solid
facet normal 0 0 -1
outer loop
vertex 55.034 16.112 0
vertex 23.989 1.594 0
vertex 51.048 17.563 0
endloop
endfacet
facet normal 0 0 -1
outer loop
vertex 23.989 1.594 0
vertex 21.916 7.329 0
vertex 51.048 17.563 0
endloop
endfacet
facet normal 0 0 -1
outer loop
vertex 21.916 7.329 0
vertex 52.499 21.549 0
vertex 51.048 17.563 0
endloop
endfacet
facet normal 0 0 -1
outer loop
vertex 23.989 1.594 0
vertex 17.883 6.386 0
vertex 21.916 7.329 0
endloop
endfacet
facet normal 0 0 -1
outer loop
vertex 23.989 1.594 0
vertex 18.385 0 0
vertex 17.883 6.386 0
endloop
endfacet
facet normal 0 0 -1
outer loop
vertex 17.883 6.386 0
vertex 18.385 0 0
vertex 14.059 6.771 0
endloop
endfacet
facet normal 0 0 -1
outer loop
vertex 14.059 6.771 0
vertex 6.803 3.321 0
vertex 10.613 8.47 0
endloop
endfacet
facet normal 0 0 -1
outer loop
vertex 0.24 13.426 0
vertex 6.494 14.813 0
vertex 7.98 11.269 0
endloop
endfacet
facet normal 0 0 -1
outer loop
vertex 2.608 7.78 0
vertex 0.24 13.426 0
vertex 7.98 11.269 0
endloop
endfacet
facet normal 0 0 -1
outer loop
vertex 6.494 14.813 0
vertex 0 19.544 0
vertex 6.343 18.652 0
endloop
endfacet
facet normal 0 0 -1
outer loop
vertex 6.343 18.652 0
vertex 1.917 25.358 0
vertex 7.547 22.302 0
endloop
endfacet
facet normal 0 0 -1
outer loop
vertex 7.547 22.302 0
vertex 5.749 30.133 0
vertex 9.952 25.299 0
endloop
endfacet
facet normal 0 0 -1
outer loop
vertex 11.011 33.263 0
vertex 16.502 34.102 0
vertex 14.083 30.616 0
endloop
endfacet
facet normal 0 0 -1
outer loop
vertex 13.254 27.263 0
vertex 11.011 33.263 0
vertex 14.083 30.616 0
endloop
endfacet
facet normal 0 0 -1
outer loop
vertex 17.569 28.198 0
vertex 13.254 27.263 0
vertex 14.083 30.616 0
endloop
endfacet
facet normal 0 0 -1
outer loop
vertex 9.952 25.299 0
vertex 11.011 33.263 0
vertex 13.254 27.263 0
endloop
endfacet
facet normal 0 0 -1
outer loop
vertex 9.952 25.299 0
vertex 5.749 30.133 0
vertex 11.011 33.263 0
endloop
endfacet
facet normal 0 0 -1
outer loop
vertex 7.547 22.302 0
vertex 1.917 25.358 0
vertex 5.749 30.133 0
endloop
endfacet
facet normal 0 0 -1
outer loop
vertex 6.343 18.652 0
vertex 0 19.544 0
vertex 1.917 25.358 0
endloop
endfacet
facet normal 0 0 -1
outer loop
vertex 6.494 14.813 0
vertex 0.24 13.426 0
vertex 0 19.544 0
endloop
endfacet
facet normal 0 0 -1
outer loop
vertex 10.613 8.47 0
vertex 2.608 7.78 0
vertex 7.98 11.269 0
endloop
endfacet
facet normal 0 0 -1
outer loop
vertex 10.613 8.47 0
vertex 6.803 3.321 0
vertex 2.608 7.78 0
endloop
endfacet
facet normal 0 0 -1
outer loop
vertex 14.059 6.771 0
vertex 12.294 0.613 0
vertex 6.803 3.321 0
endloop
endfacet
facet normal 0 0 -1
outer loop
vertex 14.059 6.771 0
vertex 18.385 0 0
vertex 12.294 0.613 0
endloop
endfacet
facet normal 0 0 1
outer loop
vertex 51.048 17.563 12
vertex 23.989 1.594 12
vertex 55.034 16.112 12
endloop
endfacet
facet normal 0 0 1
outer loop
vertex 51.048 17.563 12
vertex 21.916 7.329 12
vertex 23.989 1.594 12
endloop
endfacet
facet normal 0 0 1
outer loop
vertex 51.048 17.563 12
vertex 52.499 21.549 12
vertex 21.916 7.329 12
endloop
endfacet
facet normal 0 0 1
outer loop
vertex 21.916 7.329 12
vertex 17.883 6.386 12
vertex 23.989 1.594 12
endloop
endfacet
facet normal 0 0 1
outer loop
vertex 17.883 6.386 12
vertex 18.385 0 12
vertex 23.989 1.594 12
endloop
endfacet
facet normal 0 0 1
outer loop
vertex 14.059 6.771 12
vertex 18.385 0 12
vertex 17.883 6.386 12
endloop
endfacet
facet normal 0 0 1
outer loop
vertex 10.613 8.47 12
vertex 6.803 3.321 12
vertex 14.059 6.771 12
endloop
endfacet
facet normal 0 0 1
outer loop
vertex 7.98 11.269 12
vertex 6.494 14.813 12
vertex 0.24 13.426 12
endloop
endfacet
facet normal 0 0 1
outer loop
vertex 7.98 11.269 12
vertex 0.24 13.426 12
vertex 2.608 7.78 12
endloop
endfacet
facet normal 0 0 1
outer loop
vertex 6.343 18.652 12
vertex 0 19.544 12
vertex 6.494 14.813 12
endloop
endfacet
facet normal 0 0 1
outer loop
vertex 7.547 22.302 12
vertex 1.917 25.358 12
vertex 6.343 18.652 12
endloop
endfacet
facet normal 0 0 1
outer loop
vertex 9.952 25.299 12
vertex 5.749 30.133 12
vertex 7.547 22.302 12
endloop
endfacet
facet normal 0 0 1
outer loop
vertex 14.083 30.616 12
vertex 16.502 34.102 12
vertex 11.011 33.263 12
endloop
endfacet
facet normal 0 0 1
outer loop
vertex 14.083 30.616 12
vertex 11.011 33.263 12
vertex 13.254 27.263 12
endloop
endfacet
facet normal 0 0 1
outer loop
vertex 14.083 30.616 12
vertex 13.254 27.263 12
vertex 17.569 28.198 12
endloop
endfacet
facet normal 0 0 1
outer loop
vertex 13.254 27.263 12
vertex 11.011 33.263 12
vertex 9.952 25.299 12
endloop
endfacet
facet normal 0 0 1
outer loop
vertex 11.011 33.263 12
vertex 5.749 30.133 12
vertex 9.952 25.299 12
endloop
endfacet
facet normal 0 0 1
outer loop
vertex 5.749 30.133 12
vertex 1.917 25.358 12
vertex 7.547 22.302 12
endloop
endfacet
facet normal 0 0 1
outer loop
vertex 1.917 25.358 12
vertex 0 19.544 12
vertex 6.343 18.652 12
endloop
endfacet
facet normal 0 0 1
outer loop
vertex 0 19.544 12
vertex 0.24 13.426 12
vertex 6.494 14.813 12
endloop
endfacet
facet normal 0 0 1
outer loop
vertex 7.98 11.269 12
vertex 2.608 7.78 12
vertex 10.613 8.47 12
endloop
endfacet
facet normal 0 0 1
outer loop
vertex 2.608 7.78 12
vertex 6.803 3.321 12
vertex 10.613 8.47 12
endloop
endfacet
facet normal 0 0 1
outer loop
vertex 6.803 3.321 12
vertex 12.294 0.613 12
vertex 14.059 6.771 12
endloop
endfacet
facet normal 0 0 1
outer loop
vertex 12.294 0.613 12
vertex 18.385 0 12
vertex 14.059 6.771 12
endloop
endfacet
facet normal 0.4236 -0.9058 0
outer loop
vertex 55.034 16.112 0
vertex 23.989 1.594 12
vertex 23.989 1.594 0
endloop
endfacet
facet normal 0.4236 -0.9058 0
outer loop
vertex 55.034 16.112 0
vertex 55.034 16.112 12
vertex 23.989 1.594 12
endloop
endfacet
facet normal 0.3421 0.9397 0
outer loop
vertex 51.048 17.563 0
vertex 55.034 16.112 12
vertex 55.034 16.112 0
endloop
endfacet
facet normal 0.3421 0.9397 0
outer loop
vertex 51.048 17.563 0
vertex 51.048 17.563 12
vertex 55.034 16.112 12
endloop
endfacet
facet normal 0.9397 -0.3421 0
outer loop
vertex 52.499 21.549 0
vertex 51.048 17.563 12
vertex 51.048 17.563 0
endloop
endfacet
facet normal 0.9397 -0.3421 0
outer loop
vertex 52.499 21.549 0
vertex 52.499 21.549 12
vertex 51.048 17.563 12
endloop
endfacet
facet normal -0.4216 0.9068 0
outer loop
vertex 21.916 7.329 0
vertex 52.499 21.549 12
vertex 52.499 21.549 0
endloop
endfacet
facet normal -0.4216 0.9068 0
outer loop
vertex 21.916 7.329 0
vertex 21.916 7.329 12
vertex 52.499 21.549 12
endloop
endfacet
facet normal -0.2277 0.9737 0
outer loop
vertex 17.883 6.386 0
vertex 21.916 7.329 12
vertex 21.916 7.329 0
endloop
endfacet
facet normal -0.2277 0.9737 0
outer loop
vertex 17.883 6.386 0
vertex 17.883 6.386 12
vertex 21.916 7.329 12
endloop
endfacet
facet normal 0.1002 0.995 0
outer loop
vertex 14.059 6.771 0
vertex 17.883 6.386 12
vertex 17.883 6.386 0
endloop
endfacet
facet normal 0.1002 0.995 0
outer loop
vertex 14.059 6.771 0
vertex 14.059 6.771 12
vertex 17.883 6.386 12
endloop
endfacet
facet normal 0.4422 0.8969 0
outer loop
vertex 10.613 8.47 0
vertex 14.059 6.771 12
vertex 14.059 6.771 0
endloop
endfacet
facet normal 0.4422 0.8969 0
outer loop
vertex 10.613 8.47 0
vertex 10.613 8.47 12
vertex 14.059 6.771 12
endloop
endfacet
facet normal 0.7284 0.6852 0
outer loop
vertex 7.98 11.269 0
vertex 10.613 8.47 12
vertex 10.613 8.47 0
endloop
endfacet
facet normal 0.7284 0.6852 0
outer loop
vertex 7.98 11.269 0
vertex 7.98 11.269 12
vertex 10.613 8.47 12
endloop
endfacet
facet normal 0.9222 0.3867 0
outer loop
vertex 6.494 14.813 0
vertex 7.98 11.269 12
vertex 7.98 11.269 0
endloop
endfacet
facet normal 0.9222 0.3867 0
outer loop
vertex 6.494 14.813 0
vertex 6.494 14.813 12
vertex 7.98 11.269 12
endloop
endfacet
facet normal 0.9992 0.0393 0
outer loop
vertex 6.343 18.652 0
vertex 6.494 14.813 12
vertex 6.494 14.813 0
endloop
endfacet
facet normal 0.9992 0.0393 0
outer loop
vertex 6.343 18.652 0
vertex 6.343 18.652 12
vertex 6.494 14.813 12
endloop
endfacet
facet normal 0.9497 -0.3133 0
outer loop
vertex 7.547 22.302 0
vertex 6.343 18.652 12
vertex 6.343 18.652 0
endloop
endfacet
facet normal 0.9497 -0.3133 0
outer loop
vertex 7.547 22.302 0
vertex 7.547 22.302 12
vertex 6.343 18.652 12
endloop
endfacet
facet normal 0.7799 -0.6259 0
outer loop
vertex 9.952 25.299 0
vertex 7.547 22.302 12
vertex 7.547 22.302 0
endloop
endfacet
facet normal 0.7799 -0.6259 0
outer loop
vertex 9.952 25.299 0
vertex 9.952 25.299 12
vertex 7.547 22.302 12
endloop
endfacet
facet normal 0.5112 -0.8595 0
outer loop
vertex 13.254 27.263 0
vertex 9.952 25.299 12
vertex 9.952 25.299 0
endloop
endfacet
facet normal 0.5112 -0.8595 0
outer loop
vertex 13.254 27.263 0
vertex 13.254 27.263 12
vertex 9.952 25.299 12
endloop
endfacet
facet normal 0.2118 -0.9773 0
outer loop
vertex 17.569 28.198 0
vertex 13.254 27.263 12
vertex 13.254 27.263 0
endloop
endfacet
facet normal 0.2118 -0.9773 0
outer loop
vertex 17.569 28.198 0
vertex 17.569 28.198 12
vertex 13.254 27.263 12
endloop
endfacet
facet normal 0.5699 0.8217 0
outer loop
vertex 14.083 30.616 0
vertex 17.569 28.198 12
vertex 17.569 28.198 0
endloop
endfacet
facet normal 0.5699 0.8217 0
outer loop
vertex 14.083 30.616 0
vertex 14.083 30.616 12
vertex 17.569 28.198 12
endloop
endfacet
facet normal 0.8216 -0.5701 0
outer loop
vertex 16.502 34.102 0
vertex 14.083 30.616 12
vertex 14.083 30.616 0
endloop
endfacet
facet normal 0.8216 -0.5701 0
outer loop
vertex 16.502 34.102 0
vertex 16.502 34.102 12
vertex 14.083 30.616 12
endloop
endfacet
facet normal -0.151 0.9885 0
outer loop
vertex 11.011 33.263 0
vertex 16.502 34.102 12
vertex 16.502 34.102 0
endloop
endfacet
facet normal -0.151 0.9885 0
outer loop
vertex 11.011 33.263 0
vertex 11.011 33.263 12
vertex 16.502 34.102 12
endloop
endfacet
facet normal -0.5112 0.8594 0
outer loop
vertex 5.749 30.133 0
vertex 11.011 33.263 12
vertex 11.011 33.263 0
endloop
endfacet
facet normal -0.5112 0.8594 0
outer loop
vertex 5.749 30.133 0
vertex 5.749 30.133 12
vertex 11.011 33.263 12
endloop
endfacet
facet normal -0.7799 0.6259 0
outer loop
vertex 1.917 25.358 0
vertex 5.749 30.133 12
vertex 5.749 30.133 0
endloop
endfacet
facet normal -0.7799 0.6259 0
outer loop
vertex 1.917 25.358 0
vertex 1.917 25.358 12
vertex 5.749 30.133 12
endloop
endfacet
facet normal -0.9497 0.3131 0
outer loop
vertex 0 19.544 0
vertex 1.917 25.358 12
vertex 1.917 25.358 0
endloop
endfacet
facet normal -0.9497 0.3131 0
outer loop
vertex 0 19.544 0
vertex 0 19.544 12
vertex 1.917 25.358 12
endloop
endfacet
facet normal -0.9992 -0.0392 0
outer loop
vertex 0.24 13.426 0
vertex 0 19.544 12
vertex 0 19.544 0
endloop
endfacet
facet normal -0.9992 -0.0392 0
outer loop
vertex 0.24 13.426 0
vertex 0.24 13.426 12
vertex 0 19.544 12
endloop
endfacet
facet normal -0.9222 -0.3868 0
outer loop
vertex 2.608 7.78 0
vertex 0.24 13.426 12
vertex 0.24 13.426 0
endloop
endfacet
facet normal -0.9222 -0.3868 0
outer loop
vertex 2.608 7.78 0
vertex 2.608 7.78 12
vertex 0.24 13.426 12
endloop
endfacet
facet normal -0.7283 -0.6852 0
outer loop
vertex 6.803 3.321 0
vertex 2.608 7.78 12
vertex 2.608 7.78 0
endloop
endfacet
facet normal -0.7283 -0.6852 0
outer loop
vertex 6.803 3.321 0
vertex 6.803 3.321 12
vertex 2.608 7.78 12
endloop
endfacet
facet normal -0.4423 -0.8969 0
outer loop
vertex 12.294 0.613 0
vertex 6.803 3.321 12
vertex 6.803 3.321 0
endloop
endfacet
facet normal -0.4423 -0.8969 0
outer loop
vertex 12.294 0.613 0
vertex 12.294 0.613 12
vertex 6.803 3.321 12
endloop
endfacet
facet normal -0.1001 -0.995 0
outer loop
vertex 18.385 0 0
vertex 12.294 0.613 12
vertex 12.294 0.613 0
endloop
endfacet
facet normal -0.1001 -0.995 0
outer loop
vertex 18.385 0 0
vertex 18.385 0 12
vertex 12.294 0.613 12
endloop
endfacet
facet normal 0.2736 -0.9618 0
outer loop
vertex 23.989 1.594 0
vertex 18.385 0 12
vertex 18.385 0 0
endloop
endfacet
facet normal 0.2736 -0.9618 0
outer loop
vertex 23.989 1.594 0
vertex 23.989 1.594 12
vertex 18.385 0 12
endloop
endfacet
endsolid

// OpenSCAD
$fn = 32;

// ----------------------------------------------------------------------
// Hook plate: curl radius 14 mm over 205 degrees, 6 mm thick band
// ----------------------------------------------------------------------

// --- parameters (mm) ---
profile_height = 12;      // extrusion height
profile_points = 26;      // points of the closed outline

profile = [[14.083, 30.616], [16.502, 34.102], [11.011, 33.263], [5.749, 30.133], [1.917, 25.358], [0, 19.544], [0.24, 13.426], [2.608, 7.78], [6.803, 3.321], [12.294, 0.613], [18.385, 0], [23.989, 1.594], [55.034, 16.112], [51.048, 17.563], [52.499, 21.549], [21.916, 7.329], [17.883, 6.386], [14.059, 6.771], [10.613, 8.47], [7.98, 11.269], [6.494, 14.813], [6.343, 18.652], [7.547, 22.302], [9.952, 25.299], [13.254, 27.263], [17.569, 28.198]];  // single closed polygon, 26 points, counter clockwise

// --- the one profile operation ---
linear_extrude(height = profile_height) polygon(points = profile);
